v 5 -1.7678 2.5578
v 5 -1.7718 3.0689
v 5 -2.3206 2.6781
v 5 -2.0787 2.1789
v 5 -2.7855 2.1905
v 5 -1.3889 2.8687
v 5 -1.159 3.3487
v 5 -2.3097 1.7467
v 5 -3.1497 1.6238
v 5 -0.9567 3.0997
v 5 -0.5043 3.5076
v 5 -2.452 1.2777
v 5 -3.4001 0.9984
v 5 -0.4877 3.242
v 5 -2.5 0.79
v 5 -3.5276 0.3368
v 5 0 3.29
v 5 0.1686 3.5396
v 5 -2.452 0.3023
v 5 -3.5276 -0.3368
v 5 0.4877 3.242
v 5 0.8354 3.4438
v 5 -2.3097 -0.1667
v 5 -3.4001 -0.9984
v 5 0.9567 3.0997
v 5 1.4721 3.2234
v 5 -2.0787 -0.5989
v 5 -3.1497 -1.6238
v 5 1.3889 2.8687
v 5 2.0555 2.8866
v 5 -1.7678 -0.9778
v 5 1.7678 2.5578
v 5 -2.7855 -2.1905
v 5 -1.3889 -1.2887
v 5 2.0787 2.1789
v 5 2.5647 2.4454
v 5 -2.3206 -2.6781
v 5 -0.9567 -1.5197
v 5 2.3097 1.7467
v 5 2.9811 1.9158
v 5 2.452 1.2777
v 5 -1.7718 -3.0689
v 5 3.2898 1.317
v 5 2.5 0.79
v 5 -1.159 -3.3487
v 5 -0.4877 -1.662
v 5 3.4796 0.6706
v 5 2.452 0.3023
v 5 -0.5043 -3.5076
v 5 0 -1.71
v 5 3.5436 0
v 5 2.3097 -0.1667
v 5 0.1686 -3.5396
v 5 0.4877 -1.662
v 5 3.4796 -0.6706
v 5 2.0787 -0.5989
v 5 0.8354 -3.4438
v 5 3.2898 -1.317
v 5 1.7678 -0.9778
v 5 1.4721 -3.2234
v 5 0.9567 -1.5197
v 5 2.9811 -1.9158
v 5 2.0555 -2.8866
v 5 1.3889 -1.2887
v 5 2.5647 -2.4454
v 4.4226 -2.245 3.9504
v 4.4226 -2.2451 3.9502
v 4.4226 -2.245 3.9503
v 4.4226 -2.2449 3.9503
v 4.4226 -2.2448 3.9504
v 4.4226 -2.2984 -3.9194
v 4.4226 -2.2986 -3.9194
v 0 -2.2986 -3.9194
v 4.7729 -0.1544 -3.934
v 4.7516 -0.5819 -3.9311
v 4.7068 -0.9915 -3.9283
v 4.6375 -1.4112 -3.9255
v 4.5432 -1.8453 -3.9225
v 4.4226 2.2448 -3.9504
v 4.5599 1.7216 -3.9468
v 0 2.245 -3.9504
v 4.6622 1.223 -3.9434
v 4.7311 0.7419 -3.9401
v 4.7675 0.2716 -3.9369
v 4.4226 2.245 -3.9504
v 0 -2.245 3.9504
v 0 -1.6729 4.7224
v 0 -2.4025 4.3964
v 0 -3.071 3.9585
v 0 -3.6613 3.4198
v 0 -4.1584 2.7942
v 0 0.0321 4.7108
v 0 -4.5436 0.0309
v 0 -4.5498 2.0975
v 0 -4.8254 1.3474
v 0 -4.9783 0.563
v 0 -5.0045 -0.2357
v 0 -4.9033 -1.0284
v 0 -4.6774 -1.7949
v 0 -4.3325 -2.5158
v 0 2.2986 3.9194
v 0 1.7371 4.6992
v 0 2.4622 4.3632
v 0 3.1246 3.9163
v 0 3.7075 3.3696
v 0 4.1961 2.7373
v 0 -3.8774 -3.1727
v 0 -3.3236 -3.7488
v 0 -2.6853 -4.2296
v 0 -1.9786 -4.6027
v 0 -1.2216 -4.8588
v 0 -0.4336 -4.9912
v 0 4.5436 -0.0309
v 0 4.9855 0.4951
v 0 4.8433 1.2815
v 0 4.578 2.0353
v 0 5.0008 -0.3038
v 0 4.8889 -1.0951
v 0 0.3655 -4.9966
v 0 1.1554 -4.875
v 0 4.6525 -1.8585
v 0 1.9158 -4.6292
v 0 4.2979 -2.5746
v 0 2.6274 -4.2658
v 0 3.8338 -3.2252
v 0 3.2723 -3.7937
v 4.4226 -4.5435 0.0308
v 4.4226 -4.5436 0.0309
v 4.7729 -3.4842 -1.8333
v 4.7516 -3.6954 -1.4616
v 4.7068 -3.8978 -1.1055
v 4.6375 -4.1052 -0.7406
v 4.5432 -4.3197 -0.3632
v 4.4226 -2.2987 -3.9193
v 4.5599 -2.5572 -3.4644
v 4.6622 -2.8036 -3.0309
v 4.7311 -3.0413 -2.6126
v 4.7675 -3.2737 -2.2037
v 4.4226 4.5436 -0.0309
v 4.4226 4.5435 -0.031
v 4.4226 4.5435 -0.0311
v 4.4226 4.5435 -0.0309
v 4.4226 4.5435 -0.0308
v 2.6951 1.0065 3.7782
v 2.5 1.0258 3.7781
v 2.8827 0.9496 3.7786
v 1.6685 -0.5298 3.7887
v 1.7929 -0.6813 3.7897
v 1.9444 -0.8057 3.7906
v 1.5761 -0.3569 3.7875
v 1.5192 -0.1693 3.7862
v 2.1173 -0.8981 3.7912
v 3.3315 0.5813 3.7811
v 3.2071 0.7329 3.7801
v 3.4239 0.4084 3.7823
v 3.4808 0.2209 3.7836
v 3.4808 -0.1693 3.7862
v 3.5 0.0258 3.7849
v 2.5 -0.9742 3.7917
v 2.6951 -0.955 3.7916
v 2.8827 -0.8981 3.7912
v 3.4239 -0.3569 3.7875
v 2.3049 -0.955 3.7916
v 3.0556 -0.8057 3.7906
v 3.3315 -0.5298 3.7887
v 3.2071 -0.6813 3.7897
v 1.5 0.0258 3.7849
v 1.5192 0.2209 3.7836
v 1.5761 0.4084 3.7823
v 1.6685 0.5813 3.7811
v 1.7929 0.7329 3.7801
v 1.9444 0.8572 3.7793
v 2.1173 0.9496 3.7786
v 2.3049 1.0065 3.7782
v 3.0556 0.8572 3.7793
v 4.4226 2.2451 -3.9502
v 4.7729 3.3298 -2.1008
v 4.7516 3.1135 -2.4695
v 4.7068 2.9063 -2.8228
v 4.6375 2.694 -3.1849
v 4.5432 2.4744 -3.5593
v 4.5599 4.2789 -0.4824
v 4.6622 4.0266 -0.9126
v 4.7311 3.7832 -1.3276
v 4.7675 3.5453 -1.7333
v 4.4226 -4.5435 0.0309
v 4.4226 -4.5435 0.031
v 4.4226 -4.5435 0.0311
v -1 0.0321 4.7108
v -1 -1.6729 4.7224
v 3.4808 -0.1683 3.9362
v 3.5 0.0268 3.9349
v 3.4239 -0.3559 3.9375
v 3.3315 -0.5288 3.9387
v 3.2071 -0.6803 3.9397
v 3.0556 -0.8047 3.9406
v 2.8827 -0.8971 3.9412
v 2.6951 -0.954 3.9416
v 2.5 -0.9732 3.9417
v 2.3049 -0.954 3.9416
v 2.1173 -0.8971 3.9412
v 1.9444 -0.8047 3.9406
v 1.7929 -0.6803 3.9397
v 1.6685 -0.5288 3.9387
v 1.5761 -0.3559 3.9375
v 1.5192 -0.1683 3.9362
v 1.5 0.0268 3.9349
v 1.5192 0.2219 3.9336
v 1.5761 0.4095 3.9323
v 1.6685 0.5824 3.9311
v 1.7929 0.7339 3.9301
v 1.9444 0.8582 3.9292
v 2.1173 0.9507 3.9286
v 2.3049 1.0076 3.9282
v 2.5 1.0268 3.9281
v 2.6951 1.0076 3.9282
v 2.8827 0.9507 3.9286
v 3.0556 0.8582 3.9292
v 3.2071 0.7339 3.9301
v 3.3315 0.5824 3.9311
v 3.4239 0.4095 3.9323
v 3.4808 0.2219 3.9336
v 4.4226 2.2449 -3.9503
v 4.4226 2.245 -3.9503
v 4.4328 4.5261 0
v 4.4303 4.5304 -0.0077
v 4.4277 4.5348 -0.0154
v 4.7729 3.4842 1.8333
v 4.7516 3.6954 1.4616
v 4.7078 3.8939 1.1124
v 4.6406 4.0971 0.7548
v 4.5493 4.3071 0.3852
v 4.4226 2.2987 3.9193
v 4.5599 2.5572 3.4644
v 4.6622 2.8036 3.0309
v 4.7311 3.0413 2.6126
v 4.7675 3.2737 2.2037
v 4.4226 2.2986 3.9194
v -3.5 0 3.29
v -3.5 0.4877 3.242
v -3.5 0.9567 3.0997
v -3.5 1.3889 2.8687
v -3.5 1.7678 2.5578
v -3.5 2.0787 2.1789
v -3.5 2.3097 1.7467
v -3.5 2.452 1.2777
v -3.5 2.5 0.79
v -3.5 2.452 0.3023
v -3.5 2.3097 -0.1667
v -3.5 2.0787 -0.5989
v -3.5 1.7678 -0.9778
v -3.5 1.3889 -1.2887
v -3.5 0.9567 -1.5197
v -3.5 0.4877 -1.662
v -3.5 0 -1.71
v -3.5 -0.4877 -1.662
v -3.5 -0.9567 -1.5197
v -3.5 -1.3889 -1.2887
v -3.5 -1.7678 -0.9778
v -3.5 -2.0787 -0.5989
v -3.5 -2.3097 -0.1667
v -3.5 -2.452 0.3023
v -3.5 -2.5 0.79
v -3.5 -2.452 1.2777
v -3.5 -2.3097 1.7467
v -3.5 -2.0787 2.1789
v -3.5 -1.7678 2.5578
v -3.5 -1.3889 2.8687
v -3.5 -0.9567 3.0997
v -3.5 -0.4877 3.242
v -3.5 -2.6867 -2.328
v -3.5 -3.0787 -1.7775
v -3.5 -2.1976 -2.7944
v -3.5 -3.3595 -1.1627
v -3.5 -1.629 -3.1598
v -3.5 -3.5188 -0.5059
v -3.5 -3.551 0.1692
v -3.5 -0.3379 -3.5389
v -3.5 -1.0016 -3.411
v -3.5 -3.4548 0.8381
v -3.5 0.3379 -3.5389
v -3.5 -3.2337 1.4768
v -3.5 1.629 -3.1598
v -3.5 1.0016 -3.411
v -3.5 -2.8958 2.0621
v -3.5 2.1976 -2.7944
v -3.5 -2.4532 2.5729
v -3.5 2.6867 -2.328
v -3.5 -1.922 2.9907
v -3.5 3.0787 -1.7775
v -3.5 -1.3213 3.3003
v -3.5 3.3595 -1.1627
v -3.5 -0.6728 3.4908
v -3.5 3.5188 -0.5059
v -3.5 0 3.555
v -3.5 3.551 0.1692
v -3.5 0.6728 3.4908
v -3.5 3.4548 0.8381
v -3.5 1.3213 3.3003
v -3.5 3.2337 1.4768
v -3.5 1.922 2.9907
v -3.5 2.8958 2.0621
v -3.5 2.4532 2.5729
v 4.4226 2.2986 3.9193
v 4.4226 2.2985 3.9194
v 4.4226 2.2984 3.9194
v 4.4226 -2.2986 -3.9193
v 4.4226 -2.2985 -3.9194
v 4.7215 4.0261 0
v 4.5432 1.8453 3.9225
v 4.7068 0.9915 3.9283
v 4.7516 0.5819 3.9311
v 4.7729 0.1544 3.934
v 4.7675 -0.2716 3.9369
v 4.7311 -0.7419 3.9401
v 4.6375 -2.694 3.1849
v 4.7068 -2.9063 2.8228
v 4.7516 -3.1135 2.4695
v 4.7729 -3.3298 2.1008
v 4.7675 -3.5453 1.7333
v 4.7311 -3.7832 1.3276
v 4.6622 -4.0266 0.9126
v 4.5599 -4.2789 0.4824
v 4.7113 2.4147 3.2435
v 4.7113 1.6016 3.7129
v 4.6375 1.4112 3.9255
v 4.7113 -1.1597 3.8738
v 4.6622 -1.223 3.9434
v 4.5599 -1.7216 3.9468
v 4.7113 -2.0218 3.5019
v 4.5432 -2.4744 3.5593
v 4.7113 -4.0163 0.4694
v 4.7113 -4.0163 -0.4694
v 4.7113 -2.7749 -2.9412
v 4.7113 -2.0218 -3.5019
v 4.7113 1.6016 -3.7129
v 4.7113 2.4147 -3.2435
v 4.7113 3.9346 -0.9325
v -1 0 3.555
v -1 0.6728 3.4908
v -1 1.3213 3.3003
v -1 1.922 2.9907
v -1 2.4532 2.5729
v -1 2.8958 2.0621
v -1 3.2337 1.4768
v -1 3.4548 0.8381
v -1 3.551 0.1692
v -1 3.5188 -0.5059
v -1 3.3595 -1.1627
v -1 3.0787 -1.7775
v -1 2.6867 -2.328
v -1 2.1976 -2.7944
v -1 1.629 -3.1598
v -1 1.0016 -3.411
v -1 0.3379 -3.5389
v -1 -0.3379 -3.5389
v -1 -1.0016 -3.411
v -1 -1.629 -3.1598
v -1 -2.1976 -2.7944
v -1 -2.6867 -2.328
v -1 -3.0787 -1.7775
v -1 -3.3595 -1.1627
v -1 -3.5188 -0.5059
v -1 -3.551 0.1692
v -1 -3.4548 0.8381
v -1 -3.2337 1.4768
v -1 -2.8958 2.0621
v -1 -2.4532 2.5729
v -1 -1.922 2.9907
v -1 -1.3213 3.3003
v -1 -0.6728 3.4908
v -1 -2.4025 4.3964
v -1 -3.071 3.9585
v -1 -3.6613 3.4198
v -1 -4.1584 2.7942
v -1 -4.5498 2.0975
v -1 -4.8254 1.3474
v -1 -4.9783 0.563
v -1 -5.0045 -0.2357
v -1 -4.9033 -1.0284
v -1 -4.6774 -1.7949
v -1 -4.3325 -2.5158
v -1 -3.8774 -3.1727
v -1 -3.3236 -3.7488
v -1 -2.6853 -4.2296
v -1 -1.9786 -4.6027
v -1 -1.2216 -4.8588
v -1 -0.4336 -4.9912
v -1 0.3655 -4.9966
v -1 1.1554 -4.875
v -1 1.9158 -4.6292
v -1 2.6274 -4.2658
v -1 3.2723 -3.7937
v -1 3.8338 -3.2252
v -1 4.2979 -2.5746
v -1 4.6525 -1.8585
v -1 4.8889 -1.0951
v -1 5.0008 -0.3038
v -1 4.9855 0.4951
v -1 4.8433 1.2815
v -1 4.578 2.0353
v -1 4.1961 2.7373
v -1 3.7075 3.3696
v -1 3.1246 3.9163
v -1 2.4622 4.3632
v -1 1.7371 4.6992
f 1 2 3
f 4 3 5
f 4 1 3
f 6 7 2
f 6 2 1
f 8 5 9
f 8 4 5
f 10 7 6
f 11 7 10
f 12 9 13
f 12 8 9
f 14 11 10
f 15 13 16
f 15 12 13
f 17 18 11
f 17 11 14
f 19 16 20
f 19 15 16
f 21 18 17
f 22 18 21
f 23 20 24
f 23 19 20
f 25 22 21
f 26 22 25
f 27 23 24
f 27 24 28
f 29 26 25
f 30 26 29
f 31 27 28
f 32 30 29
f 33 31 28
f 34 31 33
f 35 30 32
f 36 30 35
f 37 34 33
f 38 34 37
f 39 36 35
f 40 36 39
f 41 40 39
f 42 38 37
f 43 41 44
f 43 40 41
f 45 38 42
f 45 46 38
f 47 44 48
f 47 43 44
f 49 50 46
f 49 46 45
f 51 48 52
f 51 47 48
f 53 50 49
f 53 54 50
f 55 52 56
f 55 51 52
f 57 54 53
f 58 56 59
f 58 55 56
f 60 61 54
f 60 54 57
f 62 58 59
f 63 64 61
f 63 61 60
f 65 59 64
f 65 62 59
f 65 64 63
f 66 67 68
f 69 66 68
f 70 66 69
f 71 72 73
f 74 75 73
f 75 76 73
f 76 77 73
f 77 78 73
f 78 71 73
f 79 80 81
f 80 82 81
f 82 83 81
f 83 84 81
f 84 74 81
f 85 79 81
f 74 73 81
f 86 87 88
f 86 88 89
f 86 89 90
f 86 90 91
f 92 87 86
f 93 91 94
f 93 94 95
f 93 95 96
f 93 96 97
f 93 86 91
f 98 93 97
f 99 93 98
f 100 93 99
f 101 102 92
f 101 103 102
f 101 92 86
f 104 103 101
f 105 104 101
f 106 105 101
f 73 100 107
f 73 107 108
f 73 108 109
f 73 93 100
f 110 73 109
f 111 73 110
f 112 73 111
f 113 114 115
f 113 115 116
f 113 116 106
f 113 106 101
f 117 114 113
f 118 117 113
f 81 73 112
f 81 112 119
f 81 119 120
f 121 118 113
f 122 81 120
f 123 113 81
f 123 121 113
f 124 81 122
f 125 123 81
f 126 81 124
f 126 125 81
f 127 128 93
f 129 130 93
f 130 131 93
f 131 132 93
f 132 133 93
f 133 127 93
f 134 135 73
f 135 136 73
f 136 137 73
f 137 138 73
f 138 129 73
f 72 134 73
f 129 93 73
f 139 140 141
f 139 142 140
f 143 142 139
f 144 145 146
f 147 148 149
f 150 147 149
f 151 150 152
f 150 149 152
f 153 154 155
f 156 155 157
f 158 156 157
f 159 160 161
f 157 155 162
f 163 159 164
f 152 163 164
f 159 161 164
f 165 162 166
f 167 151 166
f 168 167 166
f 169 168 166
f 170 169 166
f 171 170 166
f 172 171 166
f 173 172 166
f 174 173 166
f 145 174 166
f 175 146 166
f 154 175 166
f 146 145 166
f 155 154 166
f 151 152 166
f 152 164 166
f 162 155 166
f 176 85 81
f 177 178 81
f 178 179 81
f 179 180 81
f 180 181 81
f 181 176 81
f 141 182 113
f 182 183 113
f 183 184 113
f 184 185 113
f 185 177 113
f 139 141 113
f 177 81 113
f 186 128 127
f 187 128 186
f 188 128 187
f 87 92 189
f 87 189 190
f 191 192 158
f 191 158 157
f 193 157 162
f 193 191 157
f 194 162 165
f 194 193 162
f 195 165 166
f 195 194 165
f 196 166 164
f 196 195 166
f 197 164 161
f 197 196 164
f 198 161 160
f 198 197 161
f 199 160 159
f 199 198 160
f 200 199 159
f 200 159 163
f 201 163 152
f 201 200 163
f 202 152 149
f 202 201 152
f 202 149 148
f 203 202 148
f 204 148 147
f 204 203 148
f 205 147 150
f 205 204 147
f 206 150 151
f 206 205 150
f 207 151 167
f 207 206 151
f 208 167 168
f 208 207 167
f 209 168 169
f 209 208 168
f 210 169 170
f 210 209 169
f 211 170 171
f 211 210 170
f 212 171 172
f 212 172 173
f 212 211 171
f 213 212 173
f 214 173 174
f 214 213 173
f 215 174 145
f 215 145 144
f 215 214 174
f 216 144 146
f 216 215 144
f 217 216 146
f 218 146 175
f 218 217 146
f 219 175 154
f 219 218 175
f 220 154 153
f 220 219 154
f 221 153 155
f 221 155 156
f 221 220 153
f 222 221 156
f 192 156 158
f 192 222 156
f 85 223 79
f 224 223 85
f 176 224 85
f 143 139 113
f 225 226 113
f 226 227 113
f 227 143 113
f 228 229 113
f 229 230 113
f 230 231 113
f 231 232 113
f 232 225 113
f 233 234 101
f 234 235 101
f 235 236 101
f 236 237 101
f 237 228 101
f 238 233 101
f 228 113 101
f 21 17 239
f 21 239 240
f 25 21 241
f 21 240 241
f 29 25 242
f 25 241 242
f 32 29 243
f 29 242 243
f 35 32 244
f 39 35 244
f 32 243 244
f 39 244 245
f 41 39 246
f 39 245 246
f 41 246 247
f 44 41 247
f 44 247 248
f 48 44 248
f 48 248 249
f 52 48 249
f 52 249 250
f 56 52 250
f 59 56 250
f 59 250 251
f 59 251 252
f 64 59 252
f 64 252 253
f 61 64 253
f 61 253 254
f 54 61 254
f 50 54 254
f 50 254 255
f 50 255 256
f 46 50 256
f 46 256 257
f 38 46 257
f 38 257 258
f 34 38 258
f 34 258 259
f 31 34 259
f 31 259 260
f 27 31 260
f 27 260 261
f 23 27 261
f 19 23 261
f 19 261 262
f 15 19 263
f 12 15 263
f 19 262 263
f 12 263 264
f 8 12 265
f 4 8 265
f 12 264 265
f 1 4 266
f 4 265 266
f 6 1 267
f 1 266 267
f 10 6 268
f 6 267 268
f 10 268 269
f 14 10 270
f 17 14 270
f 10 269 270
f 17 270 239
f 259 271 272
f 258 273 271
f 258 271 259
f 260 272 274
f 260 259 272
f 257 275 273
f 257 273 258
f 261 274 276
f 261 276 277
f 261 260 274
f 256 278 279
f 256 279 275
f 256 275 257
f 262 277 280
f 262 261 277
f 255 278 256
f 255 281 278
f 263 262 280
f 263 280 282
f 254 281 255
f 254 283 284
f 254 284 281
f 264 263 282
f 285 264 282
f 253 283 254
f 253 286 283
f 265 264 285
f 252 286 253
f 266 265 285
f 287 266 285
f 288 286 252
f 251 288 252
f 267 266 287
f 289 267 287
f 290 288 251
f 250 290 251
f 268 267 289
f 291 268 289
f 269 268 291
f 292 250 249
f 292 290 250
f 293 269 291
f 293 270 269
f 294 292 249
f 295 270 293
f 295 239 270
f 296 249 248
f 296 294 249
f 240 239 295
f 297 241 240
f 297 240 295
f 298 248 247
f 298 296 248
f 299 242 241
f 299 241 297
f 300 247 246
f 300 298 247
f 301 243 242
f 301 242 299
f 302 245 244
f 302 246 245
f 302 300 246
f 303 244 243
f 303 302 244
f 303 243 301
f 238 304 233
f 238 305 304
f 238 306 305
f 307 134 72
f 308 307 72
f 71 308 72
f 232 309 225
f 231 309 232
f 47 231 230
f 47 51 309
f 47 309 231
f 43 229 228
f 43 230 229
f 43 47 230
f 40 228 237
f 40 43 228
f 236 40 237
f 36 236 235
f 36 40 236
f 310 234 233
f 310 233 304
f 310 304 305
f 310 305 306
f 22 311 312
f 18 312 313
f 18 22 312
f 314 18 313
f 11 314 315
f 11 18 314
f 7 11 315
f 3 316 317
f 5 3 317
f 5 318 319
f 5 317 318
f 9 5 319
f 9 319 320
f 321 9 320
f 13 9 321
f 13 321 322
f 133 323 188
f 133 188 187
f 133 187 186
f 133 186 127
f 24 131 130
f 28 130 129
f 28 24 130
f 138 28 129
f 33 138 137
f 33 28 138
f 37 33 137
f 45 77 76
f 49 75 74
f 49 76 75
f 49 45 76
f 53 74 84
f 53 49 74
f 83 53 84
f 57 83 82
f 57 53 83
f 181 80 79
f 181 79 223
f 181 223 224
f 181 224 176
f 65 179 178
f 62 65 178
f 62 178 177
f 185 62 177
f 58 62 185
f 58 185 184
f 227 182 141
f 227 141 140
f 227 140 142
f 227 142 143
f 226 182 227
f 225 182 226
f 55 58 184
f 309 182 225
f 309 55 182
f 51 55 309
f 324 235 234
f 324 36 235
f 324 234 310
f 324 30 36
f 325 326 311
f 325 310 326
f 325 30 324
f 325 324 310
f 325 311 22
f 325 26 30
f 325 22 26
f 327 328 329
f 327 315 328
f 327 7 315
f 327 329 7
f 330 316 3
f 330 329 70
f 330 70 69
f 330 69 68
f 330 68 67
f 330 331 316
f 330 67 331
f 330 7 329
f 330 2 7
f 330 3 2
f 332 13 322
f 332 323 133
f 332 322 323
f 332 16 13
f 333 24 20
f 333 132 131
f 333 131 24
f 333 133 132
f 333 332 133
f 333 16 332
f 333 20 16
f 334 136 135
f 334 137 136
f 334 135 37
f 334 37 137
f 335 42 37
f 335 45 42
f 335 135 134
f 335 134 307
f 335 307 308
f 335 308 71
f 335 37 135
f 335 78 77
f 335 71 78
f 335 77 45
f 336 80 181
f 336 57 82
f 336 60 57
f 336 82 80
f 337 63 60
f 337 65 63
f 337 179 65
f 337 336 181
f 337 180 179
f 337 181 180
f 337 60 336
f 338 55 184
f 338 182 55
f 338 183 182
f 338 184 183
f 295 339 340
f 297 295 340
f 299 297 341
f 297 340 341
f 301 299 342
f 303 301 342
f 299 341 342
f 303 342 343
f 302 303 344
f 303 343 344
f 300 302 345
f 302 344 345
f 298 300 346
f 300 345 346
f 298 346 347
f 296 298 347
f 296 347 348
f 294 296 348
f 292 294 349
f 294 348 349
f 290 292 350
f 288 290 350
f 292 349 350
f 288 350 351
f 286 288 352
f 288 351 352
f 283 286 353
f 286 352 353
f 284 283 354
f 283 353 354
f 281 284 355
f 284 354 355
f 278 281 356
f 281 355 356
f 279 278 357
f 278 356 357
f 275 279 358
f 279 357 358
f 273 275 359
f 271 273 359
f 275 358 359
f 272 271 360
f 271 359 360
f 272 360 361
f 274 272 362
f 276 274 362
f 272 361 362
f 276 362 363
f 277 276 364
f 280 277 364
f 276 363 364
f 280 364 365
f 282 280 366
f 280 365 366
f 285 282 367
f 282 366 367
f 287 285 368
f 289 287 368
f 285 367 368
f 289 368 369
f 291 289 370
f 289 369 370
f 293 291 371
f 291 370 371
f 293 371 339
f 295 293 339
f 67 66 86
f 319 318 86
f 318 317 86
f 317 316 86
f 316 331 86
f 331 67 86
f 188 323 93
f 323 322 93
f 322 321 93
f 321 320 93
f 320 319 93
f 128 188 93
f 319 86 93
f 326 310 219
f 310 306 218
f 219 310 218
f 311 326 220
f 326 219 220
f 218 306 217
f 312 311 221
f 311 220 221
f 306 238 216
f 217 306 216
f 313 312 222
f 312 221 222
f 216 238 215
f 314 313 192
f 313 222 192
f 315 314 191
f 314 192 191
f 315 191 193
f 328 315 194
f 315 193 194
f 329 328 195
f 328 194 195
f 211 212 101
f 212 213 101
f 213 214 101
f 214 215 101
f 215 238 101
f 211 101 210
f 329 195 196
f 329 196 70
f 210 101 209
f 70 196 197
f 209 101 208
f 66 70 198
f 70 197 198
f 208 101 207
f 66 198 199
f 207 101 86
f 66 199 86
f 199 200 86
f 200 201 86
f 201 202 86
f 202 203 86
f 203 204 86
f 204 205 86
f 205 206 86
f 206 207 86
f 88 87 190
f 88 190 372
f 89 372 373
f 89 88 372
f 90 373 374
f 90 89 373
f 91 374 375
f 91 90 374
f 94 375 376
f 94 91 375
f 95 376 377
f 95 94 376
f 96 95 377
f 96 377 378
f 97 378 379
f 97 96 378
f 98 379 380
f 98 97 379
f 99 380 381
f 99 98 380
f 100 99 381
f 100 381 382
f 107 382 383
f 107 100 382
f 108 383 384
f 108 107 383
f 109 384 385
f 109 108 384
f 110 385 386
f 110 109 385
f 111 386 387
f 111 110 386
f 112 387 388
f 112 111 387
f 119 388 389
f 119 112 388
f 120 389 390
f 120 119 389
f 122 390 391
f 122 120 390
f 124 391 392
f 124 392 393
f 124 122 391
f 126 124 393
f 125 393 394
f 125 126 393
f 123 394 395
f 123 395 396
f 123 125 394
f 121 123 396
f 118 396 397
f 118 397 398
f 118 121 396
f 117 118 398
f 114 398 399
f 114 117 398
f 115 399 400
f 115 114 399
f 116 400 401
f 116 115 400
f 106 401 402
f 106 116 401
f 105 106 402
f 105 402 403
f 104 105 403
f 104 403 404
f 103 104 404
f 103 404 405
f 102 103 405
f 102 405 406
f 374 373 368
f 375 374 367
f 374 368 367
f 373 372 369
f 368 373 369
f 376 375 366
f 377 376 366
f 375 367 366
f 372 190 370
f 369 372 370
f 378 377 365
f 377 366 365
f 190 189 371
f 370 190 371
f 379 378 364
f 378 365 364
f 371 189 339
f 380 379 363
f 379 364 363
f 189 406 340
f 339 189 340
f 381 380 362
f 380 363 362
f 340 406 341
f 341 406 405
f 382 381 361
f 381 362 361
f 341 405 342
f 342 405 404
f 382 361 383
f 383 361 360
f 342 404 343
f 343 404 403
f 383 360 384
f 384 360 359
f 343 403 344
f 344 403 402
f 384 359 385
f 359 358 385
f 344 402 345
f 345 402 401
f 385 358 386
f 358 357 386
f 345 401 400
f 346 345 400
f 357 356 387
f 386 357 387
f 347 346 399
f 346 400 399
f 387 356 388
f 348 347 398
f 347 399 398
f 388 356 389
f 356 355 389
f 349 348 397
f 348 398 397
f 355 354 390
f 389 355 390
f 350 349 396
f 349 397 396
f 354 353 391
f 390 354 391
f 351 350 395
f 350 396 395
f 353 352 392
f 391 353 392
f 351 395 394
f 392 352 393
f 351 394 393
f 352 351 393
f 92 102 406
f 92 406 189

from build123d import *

# Parameters (mm, degrees)
BOSS_EXTRUDE1_DEPTH = 5
BOSS_EXTRUDE3_DEPTH = 1
SKETCH4_R           = 3.555
BOSS_EXTRUDE4_DEPTH = 2.5
SKETCH5_R           = 1
CUT_EXTRUDE3_DEPTH  = 0.15
SKETCH3_R           = 2.5
CUT_EXTRUDE5_DEPTH  = 9.5


with BuildPart() as part:
    # Sketch2 → Boss-Extrude1 (new body)
    with BuildSketch(Plane(origin=(0, 0, 0), x_dir=(0, 0, -1), z_dir=(1, 0, 0))):
        Polygon((3.919437566, -2.29861752), (3.950379949, 2.245023741), (0.030942383, 4.54364126), (-3.919437566, 2.29861752), (-3.950379949, -2.245023741), (-0.030942383, -4.54364126), align=None)
    extrude(amount=BOSS_EXTRUDE1_DEPTH)

    # Sketch6 → Boss-Extrude3 (add)
    with BuildSketch(Plane.ZY):
        with BuildLine():
            Line((4.699218, 1.737080939), (4.71082912, 0.032080939))
            Line((4.71082912, 0.032080939), (4.722440239, -1.672919061))
            ThreePointArc((4.722440239, -1.672919061), (-5.009883831, -0.034117514), (4.699218, 1.737080939))
        make_face()
    extrude(amount=BOSS_EXTRUDE3_DEPTH)

    # Sketch4 → Boss-Extrude4 (add)
    with BuildSketch(Plane.ZY.offset(1)):
        Circle(SKETCH4_R)
    extrude(amount=BOSS_EXTRUDE4_DEPTH)

    # Sketch5 → Cut-Extrude3 (cut)
    with BuildSketch(Plane(origin=(0, 0.02679689, 3.934908757), x_dir=(1, 0, 0), z_dir=(0, -0.006809883, -0.999976812))):
        with Locations((2.5, 0)):
            Circle(SKETCH5_R)
    extrude(amount=CUT_EXTRUDE3_DEPTH, mode=Mode.SUBTRACT)

    # Sketch3 → Cut-Extrude5 (cut, through all)
    with BuildSketch(Plane.ZY.offset(3.5)):
        with Locations((0.79, 0)):
            Circle(SKETCH3_R)
    extrude(amount=-CUT_EXTRUDE5_DEPTH, mode=Mode.SUBTRACT)

    # Sketch7 → Cut-Revolve1 (revolve, cut)
    with BuildSketch(Plane.XY):
        Polygon((4.422649731, 4.54364126), (5, 3.54364126), (9.422649731, 3.54364126), (9.422649731, 8.54364126), (4.422649731, 8.54364126), align=None)
    revolve(axis=Axis((0, 0, 0), (1, 0, 0)), mode=Mode.SUBTRACT)


solid = part.part
